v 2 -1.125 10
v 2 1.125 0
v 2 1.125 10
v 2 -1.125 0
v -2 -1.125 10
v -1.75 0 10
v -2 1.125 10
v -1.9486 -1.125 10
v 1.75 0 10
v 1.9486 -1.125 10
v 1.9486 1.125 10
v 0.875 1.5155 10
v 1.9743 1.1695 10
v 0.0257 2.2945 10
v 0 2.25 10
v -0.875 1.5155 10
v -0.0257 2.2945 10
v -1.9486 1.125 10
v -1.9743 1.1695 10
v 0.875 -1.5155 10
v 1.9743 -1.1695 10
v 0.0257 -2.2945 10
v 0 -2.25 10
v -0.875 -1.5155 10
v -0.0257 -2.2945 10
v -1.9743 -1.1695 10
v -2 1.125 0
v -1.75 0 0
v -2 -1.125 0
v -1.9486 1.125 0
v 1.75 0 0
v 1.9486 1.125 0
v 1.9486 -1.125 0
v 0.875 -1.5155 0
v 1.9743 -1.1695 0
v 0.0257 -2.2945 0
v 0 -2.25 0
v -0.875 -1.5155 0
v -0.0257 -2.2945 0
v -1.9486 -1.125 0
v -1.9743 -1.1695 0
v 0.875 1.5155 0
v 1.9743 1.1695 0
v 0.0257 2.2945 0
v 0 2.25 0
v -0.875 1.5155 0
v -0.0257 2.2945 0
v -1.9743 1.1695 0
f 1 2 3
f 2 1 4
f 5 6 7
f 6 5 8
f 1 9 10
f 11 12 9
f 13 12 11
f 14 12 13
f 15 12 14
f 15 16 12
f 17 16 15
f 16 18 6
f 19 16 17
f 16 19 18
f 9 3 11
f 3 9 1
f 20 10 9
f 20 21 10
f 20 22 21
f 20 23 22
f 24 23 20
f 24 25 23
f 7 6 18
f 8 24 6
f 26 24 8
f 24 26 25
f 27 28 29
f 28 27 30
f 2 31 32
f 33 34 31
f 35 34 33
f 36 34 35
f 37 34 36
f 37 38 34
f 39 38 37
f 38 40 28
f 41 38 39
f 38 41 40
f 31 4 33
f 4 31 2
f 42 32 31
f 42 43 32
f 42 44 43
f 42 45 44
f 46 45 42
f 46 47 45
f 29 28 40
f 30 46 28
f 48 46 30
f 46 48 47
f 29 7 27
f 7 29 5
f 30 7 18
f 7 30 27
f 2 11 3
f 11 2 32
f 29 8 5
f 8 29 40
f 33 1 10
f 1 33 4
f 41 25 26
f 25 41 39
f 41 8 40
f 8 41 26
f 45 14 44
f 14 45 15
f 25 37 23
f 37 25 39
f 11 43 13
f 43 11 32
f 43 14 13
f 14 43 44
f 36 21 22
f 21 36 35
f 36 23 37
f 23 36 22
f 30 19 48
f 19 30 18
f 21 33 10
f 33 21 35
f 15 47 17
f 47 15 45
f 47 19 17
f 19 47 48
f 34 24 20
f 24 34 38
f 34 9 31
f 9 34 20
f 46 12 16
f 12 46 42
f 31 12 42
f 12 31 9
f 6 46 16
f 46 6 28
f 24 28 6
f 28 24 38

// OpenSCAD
// configuration
height = 10;
hole = 3.5;
diam = 4;

length = diam;
width = diam/2 + .25;

difference() {
    union() {
        translate([
            -length/2,
            -width/2,
            0
        ]) {
            cube([
                length,
                width,
                height
            ]);
        }

        rotate([0, 0, 60]) {
            translate([
                -length/2,
                -width/2,
                0
            ]) {
                cube([
                    length,
                    width,
                    height
                ]);
            }
        };

        rotate([0, 0, 120]) {
            translate([
                -length/2,
                -width/2,
                0
            ]) {
                cube([
                    length,
                    width,
                    height
                ]);
            }
        };   
    }
    
    translate([0, 0, -2]) {
        cylinder(r=hole/2, h=height+4);
    }
}
